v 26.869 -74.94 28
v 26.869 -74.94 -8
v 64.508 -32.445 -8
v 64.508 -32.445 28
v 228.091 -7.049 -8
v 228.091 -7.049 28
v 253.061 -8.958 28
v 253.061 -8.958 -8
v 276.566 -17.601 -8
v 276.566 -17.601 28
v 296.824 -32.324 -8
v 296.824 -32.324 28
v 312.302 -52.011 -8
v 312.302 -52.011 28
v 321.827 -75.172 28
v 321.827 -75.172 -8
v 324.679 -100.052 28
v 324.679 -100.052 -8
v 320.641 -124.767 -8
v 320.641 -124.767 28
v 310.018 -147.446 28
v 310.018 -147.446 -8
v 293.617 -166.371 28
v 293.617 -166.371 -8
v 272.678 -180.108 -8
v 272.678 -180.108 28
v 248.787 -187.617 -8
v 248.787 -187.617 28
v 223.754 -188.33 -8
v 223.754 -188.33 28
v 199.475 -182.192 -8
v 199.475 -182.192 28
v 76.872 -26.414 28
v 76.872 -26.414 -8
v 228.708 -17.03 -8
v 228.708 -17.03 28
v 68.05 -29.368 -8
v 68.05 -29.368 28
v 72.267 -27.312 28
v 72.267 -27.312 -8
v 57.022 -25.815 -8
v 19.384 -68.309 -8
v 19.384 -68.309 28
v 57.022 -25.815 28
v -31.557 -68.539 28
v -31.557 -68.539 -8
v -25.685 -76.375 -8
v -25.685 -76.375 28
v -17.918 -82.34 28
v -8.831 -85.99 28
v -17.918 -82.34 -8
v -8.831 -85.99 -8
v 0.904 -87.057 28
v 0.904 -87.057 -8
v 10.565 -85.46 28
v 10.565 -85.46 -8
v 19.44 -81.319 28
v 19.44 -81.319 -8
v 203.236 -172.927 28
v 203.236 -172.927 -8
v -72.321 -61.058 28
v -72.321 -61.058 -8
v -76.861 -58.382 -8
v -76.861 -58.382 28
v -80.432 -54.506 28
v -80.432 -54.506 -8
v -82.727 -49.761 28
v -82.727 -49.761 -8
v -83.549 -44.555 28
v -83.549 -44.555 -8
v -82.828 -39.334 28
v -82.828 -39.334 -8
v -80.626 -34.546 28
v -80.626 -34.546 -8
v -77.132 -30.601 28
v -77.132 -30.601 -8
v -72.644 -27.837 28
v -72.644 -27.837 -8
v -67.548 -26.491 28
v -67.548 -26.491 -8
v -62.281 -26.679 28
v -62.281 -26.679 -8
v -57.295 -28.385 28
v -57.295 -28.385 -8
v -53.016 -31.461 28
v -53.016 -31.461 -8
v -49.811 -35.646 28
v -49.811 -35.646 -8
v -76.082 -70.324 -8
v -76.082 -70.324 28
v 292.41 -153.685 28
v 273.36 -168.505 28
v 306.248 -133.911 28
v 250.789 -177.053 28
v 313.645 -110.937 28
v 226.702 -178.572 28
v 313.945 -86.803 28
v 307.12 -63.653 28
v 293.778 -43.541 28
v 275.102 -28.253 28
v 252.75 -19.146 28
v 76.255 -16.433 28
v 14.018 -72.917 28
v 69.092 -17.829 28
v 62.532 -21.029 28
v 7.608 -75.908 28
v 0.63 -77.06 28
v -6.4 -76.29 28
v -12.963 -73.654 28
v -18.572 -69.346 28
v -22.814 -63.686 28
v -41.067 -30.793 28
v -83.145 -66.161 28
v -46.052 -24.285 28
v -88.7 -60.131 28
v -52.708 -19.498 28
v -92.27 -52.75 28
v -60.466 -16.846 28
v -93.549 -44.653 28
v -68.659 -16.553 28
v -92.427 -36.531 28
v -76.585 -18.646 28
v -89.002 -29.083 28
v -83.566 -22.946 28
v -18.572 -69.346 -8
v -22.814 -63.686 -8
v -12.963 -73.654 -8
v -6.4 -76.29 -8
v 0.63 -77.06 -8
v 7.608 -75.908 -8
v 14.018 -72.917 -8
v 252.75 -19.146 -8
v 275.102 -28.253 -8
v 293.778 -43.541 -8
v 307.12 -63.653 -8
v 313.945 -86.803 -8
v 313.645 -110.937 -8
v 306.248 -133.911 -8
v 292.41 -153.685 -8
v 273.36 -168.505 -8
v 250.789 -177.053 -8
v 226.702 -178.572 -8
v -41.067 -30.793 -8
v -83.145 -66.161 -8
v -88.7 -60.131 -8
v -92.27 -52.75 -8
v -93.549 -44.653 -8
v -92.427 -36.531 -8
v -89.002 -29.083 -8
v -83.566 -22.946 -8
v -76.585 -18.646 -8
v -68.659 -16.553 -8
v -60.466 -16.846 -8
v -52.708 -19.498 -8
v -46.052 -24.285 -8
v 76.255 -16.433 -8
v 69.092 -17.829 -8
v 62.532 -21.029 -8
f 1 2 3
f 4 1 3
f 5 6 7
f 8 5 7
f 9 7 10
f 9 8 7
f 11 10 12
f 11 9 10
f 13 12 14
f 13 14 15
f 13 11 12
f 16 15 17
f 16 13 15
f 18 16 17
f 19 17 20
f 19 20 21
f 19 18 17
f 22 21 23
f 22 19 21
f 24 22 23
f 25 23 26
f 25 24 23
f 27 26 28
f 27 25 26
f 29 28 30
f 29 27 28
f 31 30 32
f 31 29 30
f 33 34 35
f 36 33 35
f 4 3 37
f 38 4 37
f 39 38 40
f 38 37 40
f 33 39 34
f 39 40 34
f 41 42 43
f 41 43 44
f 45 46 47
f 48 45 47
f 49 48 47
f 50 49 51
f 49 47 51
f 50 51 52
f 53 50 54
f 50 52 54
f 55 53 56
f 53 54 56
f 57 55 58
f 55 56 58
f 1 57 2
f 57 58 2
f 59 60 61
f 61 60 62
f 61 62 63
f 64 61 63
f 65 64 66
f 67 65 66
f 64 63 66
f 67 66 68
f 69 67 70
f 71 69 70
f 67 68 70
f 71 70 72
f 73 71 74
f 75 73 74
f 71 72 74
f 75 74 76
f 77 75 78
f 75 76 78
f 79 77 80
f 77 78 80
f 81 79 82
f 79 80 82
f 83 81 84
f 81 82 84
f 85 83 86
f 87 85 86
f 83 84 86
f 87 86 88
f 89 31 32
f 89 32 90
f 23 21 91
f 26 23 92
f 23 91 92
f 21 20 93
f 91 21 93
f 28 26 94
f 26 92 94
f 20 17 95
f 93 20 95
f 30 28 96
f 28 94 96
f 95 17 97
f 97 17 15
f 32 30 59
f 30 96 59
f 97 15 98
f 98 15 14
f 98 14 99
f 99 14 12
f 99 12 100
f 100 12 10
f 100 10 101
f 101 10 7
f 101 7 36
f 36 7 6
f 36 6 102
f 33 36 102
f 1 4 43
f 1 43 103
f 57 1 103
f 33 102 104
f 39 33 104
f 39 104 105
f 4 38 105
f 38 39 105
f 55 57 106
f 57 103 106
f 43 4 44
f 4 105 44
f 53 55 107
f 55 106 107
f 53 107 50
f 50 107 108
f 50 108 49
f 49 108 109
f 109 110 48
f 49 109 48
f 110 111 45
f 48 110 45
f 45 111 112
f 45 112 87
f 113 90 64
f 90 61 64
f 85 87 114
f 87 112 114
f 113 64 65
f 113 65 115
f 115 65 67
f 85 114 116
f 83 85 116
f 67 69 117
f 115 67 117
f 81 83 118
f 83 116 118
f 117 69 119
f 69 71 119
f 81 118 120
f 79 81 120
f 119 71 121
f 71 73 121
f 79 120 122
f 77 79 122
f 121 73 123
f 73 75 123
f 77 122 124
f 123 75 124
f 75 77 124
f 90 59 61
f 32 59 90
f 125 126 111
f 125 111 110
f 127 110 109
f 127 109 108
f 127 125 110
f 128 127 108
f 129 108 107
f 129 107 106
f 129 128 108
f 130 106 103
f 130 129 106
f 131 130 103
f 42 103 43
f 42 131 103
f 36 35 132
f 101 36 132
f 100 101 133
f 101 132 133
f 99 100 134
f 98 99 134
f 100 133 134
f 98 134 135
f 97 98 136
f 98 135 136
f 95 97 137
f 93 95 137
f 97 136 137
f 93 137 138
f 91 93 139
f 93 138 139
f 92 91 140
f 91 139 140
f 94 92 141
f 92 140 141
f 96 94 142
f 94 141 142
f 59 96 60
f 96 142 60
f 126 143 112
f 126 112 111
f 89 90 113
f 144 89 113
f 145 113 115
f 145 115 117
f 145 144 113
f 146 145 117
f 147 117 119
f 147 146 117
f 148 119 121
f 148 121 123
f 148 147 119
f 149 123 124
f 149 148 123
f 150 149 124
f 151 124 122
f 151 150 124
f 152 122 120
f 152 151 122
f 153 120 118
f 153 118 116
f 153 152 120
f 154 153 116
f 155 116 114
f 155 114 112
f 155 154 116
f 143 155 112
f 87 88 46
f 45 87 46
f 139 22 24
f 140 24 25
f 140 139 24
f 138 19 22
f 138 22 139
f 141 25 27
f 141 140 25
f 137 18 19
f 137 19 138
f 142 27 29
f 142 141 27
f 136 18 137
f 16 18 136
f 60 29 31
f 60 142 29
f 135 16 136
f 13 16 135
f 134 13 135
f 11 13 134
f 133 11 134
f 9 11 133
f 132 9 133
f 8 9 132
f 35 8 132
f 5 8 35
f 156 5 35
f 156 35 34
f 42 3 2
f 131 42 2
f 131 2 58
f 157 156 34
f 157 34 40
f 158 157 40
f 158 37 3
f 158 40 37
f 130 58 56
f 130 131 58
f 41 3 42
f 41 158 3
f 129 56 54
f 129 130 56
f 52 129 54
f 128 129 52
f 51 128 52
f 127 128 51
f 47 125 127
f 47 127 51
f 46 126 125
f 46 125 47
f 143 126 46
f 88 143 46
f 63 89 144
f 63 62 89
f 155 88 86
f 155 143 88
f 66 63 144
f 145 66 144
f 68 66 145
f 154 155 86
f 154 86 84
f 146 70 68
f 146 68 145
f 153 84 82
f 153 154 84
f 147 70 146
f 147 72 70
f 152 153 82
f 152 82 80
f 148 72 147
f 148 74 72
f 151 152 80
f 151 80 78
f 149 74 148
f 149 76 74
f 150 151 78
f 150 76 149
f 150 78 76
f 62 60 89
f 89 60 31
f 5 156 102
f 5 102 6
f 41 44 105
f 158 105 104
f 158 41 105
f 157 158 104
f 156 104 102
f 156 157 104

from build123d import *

# Parameters (mm, degrees)
EXTRUDE_THIN1_DEPTH      = 28
EXTRUDE_THIN1_DEPTH_BACK = 8


with BuildPart() as part:
    # Sketch1 → Extrude-Thin1 (new, two sides: drawn at the far end of the back side and taken through both)
    with BuildSketch(Plane.XY.offset(-EXTRUDE_THIN1_DEPTH_BACK)):
        with BuildLine():
            Line((19.383566169, -68.309294305), (57.022380557, -25.814786092))
            ThreePointArc((57.022380557, -25.814786092), (65.70728891, -19.214238602), (76.255341013, -16.4333292))
            Line((76.255341013, -16.4333292), (228.091165061, -7.048771065))
            ThreePointArc((228.091165061, -7.048771065), (323.514042398, -112.549255422), (199.474713255, -182.192076622))
            Line((199.474713255, -182.192076622), (-76.082369589, -70.323577063))
            ThreePointArc((-76.082369589, -70.323577063), (-86.509762237, -25.814215154), (-41.067256055, -30.793416585))
            Line((-41.067256055, -30.793416585), (-22.813516306, -63.686280276))
            ThreePointArc((-22.813516306, -63.686280276), (-2.911096467, -76.915520396), (19.383566169, -68.309294305))
        make_face()
        with BuildLine():
            Line((26.869376151, -74.939727844), (64.508190539, -32.44521963))
            ThreePointArc((64.508190539, -32.44521963), (70.091345909, -28.20201053), (76.872236546, -26.414283057))
            Line((76.872236546, -26.414283057), (228.708060595, -17.029724922))
            ThreePointArc((228.708060595, -17.029724922), (313.644907456, -110.93674946), (203.236273822, -172.926513385))
            Line((203.236273822, -172.926513385), (-72.320809021, -61.058013827))
            ThreePointArc((-72.320809021, -61.058013827), (-79.024132867, -32.444852599), (-49.811093178, -35.645767804))
            Line((-49.811093178, -35.645767804), (-31.557353429, -68.538631496))
            ThreePointArc((-31.557353429, -68.538631496), (-4.00015673, -86.856040893), (26.869376151, -74.939727844))
        make_face(mode=Mode.SUBTRACT)
    extrude(amount=EXTRUDE_THIN1_DEPTH + EXTRUDE_THIN1_DEPTH_BACK)


solid = part.part
